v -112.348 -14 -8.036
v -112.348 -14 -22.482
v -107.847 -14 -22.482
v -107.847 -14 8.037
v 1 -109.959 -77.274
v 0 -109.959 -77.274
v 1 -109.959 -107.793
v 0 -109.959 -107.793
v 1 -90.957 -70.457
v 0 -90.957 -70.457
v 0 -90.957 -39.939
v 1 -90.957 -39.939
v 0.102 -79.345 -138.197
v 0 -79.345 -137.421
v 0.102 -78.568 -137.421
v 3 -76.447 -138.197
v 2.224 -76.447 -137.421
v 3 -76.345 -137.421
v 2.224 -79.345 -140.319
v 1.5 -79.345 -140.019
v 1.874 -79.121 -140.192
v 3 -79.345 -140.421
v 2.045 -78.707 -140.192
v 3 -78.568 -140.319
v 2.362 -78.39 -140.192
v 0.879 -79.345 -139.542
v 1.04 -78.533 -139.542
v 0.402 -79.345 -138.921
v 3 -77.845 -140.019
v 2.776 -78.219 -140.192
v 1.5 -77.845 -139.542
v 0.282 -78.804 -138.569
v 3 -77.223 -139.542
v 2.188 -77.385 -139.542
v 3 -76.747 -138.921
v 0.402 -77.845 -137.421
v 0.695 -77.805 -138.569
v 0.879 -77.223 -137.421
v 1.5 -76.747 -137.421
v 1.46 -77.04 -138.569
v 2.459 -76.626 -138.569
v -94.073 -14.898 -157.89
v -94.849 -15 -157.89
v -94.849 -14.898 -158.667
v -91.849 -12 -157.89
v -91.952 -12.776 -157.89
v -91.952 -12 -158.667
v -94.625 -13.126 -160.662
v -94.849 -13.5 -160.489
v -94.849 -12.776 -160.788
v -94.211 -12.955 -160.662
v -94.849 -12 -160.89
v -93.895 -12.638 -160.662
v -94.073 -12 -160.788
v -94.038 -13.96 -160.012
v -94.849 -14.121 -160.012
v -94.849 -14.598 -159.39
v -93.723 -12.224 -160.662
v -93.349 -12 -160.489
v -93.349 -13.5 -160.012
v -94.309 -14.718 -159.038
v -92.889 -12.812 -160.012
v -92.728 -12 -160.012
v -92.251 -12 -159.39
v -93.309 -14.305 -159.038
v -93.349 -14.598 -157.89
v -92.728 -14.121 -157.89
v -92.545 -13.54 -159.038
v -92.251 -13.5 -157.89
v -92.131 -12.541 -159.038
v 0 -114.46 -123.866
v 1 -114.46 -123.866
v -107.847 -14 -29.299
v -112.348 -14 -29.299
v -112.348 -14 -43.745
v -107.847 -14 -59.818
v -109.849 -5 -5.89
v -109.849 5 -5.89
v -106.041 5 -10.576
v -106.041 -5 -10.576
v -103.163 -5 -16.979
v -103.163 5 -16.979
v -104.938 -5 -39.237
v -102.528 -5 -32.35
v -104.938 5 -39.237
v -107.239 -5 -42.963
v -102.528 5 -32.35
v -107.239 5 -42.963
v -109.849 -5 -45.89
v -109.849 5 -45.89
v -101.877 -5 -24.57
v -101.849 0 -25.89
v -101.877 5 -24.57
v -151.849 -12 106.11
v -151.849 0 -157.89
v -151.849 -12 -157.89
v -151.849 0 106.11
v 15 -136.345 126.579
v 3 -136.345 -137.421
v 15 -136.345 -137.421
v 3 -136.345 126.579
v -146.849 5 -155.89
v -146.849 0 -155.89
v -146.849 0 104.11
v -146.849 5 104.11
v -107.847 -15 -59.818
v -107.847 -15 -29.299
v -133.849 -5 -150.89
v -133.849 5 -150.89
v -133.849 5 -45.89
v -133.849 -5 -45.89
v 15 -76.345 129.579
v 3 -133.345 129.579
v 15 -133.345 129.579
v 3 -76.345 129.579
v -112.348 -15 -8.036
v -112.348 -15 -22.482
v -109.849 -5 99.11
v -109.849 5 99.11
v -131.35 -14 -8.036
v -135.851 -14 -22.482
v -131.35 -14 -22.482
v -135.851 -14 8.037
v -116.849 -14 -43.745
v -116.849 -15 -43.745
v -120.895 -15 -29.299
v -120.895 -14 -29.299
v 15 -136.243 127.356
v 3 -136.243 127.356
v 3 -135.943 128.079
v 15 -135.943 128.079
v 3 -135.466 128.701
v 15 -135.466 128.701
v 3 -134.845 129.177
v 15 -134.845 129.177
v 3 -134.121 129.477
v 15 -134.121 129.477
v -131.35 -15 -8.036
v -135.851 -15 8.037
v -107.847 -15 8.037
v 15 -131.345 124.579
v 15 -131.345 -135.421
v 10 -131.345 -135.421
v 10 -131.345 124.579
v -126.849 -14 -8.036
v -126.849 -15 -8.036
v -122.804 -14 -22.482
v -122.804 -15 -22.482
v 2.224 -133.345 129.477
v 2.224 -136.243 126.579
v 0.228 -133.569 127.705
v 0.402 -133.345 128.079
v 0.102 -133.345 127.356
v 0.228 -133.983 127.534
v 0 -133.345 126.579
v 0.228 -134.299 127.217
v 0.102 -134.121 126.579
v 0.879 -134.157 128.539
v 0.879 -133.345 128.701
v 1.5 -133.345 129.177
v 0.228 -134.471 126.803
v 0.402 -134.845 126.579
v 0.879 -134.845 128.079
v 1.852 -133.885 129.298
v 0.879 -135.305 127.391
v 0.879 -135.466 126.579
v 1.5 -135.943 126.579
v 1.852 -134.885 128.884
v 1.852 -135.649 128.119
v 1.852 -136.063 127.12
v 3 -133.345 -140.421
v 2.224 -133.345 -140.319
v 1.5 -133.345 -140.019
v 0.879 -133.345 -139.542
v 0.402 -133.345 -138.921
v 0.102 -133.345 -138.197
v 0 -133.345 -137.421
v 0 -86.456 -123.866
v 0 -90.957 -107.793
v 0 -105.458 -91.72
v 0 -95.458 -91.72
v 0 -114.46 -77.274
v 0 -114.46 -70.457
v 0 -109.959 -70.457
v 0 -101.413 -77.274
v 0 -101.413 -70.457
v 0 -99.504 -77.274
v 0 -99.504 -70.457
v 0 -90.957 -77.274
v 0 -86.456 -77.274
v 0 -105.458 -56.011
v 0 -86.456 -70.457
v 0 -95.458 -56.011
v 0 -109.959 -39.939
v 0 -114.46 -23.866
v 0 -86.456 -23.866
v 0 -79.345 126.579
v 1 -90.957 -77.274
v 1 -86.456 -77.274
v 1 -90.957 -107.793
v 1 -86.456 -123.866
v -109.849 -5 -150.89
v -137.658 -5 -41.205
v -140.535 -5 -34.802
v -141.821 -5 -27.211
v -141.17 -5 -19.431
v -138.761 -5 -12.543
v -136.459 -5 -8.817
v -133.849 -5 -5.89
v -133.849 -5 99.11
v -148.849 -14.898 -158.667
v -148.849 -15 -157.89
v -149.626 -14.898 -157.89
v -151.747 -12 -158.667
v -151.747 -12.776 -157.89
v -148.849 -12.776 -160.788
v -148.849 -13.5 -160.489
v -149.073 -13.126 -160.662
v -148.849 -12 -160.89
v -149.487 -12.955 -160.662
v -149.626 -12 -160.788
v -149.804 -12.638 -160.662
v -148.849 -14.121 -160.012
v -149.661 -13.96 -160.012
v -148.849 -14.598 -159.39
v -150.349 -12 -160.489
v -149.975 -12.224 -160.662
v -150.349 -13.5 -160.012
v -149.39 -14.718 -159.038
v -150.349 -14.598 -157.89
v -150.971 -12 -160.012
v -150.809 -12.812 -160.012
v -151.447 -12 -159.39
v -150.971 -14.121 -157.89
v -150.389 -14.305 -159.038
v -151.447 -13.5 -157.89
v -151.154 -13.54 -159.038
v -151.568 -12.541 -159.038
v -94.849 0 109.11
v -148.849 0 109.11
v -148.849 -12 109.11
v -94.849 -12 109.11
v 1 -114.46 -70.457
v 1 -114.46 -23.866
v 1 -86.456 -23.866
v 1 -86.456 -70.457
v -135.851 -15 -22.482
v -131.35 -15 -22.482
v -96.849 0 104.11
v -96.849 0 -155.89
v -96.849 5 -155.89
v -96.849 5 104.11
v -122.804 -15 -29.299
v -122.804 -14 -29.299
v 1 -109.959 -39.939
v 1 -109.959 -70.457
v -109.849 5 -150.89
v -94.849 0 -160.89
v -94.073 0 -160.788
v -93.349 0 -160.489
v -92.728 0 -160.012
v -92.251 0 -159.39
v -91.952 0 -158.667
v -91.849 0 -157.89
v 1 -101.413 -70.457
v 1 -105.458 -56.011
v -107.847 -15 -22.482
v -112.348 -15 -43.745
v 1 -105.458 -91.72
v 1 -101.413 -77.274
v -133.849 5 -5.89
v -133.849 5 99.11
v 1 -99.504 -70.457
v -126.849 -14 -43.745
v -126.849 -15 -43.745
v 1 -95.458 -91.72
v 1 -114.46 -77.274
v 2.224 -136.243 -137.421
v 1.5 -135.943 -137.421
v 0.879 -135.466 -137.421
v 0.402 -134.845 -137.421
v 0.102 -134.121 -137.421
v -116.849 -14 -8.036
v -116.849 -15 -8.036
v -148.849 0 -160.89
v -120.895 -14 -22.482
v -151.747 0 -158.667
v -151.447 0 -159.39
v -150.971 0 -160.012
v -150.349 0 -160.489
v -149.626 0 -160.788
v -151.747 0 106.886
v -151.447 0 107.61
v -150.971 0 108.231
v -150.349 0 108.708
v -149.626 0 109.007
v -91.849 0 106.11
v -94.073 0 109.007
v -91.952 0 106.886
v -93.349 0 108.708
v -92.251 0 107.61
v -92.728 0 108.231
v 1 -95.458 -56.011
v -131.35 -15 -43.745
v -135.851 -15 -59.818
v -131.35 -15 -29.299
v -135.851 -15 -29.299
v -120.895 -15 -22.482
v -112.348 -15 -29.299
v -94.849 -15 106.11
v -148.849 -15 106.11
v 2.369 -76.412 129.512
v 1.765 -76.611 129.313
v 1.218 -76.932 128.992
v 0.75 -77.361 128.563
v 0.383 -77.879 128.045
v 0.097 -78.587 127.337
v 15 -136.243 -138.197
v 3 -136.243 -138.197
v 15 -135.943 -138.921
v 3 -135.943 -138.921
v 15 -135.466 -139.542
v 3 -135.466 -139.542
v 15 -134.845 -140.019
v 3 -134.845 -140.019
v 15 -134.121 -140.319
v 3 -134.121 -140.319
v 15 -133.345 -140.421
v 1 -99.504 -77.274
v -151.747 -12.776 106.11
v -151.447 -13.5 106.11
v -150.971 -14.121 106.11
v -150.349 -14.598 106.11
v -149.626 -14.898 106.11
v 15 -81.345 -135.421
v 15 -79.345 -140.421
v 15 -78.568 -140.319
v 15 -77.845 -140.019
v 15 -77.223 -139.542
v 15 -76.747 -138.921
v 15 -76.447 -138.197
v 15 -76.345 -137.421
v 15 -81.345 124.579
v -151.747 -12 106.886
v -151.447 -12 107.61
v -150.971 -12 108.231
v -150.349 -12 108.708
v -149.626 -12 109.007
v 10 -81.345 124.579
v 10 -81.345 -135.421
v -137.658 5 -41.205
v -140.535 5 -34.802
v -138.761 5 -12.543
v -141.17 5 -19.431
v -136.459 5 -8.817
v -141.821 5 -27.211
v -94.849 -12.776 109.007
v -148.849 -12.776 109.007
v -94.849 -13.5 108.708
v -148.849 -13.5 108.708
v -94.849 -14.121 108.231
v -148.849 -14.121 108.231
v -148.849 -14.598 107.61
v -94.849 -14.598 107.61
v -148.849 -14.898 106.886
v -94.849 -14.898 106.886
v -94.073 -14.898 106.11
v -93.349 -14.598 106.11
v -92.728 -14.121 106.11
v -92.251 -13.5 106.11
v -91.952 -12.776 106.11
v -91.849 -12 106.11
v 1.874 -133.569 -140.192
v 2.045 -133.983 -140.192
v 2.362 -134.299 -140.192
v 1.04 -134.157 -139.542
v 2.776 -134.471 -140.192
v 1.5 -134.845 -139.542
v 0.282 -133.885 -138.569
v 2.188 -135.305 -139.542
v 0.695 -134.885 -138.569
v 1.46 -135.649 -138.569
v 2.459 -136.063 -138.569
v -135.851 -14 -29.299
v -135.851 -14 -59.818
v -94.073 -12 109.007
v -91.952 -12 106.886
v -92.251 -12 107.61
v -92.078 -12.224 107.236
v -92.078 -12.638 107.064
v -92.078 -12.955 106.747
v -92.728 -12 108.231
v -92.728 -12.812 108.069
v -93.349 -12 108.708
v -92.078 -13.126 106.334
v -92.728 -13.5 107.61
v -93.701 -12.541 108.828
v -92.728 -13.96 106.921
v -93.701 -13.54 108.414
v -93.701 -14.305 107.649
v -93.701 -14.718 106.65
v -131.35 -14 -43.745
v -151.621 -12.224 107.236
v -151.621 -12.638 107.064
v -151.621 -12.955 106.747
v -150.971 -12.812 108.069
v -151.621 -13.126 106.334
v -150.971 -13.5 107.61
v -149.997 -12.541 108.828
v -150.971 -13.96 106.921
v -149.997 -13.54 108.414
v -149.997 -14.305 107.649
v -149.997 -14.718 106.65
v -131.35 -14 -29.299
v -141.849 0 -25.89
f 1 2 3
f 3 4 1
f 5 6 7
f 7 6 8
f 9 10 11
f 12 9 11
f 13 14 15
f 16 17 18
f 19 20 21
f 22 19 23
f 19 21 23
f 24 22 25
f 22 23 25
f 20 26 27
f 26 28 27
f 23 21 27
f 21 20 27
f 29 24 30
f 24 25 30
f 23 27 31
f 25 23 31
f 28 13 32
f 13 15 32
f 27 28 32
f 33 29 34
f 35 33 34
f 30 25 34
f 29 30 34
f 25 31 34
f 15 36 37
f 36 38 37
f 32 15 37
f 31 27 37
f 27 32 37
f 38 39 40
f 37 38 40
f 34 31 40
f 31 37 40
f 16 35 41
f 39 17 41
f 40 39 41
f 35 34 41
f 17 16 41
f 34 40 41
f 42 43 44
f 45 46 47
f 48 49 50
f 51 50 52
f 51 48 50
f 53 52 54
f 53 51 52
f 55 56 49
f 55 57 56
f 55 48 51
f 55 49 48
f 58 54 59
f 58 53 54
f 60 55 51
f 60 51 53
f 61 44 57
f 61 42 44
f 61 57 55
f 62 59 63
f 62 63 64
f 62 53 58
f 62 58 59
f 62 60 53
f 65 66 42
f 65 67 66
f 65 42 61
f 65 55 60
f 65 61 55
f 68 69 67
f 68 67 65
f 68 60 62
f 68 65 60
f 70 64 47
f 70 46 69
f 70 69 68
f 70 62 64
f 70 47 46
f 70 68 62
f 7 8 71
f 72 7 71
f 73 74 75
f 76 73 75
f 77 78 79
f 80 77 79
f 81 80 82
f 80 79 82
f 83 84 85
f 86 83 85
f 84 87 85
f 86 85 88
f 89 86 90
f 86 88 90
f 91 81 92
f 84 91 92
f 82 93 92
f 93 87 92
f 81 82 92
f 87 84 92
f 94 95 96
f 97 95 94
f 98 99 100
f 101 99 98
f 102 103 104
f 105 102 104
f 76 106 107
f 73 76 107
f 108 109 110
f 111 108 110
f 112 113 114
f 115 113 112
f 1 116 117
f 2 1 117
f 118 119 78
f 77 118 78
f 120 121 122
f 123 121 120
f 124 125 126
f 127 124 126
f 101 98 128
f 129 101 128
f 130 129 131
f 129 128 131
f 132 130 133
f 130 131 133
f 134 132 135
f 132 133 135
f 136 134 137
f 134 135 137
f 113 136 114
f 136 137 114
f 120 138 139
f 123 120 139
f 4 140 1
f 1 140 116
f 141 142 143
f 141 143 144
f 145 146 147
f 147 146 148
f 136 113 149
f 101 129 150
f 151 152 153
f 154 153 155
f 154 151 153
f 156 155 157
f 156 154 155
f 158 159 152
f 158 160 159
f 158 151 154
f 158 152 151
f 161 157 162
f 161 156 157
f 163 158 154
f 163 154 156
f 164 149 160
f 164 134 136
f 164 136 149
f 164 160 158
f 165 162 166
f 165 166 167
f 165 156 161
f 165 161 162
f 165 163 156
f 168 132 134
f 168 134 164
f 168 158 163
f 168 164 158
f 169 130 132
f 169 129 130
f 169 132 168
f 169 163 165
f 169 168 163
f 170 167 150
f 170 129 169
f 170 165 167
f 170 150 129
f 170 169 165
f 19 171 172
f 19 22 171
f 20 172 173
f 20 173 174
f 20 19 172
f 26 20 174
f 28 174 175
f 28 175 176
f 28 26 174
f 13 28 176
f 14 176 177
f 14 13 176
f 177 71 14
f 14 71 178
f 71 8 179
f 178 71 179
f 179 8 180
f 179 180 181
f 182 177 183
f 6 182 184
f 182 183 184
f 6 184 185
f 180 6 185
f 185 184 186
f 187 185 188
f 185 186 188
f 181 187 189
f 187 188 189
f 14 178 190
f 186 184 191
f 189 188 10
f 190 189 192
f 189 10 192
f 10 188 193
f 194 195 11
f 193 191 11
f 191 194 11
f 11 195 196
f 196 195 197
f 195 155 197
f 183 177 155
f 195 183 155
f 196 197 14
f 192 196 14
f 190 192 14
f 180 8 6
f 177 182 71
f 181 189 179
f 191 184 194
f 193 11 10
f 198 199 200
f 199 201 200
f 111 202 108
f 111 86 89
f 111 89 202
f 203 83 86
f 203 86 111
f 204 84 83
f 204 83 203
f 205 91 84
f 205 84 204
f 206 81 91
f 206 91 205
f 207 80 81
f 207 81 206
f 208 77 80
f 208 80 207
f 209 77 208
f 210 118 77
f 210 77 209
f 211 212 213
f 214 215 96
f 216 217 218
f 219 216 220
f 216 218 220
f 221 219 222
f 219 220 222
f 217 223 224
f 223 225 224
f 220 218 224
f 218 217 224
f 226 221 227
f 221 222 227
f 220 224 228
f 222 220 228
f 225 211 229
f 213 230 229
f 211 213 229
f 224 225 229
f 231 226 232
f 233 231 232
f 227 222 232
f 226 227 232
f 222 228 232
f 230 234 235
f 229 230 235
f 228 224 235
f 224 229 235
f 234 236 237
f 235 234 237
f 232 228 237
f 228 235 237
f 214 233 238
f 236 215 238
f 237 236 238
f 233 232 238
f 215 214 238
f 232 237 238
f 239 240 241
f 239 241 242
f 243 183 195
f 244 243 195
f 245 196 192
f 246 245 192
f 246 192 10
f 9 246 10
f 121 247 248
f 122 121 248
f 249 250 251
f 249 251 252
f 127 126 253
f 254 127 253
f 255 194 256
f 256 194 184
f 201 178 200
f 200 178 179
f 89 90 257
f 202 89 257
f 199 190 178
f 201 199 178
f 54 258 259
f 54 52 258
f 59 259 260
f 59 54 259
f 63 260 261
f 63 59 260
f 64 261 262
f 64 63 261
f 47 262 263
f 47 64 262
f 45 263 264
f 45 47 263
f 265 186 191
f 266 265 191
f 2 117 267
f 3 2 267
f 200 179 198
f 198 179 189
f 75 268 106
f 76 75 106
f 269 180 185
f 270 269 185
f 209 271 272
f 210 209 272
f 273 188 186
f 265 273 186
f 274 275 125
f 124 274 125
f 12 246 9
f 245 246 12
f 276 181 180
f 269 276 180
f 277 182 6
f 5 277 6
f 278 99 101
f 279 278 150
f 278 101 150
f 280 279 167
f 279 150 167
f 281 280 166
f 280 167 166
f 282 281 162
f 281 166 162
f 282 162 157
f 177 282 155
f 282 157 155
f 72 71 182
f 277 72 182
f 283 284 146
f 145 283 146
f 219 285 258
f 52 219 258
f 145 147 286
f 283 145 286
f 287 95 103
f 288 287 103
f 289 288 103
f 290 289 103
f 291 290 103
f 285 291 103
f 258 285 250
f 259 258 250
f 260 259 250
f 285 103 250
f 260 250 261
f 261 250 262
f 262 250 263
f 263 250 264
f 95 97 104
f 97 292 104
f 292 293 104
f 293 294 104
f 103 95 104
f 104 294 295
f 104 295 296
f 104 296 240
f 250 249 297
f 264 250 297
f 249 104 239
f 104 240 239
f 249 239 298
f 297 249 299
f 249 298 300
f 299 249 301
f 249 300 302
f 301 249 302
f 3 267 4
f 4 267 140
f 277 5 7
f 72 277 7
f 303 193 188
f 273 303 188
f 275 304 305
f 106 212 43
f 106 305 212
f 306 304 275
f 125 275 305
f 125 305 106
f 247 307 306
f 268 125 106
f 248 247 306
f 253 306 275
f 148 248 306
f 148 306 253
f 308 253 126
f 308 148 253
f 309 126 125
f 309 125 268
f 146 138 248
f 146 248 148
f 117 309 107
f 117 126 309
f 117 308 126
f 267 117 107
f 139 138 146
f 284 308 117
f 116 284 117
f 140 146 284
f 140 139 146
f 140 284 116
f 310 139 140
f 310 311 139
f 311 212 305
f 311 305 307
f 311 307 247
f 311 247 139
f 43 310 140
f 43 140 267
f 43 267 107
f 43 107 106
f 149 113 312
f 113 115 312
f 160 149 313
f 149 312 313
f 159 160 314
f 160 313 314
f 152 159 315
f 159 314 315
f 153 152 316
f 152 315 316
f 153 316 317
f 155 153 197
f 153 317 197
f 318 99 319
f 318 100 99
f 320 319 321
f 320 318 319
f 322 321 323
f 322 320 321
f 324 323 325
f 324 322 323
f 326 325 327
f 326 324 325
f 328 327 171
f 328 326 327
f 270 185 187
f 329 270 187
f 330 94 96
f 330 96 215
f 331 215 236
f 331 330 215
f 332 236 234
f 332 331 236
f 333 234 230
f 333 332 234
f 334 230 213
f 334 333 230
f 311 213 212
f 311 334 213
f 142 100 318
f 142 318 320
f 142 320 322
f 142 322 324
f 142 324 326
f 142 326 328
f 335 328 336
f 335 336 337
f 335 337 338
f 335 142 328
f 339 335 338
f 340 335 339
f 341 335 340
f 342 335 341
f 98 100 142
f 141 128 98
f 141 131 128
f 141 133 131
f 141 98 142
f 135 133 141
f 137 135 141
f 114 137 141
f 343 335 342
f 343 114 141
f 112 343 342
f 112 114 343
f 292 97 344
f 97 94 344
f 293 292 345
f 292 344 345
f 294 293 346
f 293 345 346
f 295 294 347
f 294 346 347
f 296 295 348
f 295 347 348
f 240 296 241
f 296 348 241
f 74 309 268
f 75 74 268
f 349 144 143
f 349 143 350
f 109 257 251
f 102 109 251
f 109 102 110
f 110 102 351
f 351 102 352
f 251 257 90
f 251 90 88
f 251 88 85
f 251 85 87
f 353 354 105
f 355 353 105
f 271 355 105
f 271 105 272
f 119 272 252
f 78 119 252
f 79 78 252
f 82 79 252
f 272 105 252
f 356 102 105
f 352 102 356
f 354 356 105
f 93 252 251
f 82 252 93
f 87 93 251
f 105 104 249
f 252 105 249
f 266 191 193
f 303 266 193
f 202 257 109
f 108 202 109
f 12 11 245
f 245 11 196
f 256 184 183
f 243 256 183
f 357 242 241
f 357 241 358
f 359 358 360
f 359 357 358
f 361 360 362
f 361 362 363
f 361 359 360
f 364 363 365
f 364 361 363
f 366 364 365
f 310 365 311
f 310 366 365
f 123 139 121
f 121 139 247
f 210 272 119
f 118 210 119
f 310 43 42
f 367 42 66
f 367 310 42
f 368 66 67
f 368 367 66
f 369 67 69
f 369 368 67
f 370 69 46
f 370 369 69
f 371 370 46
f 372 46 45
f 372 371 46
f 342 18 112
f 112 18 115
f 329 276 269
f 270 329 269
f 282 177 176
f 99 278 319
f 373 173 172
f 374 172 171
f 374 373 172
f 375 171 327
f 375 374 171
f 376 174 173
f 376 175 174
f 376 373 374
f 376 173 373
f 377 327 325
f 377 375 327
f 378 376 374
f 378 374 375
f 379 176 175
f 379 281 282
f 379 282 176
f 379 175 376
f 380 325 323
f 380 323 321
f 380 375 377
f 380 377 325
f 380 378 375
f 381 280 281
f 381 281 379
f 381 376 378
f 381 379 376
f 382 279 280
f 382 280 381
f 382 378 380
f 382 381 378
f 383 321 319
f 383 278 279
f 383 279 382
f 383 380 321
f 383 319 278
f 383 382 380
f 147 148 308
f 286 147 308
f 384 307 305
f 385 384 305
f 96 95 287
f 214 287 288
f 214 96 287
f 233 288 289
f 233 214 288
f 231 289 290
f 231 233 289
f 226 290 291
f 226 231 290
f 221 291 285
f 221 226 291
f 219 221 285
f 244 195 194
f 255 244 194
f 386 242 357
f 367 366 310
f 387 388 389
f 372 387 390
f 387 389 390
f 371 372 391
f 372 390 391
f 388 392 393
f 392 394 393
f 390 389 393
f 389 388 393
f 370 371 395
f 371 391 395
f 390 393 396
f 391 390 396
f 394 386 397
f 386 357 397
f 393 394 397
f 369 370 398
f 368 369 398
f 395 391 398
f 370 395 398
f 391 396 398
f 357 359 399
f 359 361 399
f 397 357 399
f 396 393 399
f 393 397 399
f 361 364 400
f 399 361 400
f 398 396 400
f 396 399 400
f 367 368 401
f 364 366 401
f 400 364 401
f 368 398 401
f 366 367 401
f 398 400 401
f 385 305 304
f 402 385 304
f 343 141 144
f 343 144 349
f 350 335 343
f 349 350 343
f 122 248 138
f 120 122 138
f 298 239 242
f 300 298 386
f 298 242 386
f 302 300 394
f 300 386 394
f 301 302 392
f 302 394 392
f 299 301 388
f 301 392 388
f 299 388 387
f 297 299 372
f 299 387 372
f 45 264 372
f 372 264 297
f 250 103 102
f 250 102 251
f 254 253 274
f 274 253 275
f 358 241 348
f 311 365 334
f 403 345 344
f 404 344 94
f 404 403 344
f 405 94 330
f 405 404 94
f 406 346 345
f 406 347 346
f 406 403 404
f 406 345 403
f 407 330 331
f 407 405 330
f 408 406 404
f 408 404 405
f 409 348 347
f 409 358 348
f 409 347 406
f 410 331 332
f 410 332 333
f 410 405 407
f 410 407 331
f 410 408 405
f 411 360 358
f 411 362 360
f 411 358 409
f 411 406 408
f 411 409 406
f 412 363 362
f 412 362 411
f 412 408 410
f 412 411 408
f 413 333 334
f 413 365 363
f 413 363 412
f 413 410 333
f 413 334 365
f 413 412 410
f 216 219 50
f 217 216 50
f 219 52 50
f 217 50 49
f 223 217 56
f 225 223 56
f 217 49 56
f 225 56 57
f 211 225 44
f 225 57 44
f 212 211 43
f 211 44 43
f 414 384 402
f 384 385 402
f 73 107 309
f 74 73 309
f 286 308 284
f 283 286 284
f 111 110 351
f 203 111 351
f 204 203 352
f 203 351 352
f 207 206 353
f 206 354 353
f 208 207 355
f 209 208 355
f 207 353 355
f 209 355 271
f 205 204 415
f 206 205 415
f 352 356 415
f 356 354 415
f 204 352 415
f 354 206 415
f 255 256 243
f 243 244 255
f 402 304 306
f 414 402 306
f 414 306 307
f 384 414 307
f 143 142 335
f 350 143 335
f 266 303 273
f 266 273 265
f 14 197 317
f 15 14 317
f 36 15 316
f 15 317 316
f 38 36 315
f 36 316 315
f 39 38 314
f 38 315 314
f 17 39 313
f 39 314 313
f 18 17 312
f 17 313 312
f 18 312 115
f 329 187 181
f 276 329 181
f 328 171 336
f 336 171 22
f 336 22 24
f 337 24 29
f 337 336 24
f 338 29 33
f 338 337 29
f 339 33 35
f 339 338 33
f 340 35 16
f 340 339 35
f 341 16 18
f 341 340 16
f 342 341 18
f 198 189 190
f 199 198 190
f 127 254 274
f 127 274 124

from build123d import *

# Parameters (mm, degrees)
F0_W      = 60
F0_H      = 270
F2_DEPTH  = 15
F3_W      = 50
F3_H      = 260
F4_DEPTH  = 5
F1_W      = 60
F1_H      = 270
F5_DEPTH  = 15
F6_W      = 50
F6_H      = 260
F7_DEPTH  = 5
F9_DEPTH  = 10
F10_R     = 3
F11_R     = 3
F13_DEPTH = 1
F15_DEPTH = 1


# Not quite as in the source:
# - a feature names something its author has since deleted; it is built from what else it names


with BuildPart() as f2:
    # F0 (on Front) → F2 (new body)
    with BuildSketch(Plane.XZ):
        with Locations((-121.8493213905, -25.8904273567)):
            Rectangle(F0_W, F0_H)
    extrude(amount=F2_DEPTH)

    # F3 (on face) → F4 (join)
    with BuildSketch(Plane.XZ):
        with Locations((-121.8493213905, -25.8904273567)):
            Rectangle(F3_W, F3_H)
    extrude(amount=-F4_DEPTH)

    # F8 (on face) → F9 (cut)
    with BuildSketch(Plane(origin=(0, 5, 0), x_dir=(-1, 0, 0), z_dir=(0, 1, 0))):
        with BuildLine():
            Line((109.8493213905, -150.8904273567), (133.8493213905, -150.8904273567))
            Line((133.8493213905, -150.8904273567), (133.8493213905, -45.8904273567))
            add(Edge.make_bspline(
                [(109.8493213905, -45.8904273567), (121.8493213905, -57.1404273567), (133.8493213905, -45.8904273567)],
                knots=[2.4980915448, 2.4980915448, 2.4980915448, 3.7850937624, 3.7850937624, 3.7850937624], degree=2, weights=[1, 0.8, 1]))
            Line((109.8493213905, -45.8904273567), (109.8493213905, -150.8904273567))
        make_face()
        with BuildLine():
            add(Edge.make_bspline(
                [(133.8493213905, -5.8904273567), (128.5159880572, -0.8904273567), (121.8493213905, -0.8904273567)],
                knots=[5.6396841984, 5.6396841984, 5.6396841984, 6.2831853072, 6.2831853072, 6.2831853072], degree=2, weights=[1, 0.9486832981, 1]))
            Line((133.8493213905, -5.8904273567), (133.8493213905, 99.1095726433))
            Line((133.8493213905, 99.1095726433), (109.8493213905, 99.1095726433))
            Line((109.8493213905, 99.1095726433), (109.8493213905, -5.8904273567))
            add(Edge.make_bspline(
                [(121.8493213905, -0.8904273567), (115.1826547239, -0.8904273567), (109.8493213905, -5.8904273567)],
                knots=[0, 0, 0, 0.6435011088, 0.6435011088, 0.6435011088], degree=2, weights=[1, 0.9486832981, 1]))
        make_face()
        with BuildLine():
            Line((133.8493213905, -5.8904273567), (133.8493213905, -45.8904273567))
            add(Edge.make_bspline(
                [(133.8493213905, -45.8904273567), (155.1826547239, -25.8904273567), (133.8493213905, -5.8904273567)],
                knots=[3.7850937624, 3.7850937624, 3.7850937624, 5.6396841984, 5.6396841984, 5.6396841984], degree=2, weights=[1, 0.6, 1]))
        make_face()
        with BuildLine():
            add(Edge.make_bspline(
                [(109.8493213905, -45.8904273567), (121.8493213905, -57.1404273567), (133.8493213905, -45.8904273567)],
                knots=[2.4980915448, 2.4980915448, 2.4980915448, 3.7850937624, 3.7850937624, 3.7850937624], degree=2, weights=[1, 0.8, 1]))
            Line((133.8493213905, -45.8904273567), (133.8493213905, -5.8904273567))
            add(Edge.make_bspline(
                [(133.8493213905, -5.8904273567), (128.5159880572, -0.8904273567), (121.8493213905, -0.8904273567)],
                knots=[5.6396841984, 5.6396841984, 5.6396841984, 6.2831853072, 6.2831853072, 6.2831853072], degree=2, weights=[1, 0.9486832981, 1]))
            add(Edge.make_bspline(
                [(121.8493213905, -0.8904273567), (115.1826547239, -0.8904273567), (109.8493213905, -5.8904273567)],
                knots=[0, 0, 0, 0.6435011088, 0.6435011088, 0.6435011088], degree=2, weights=[1, 0.9486832981, 1]))
            Line((109.8493213905, -5.8904273567), (109.8493213905, -45.8904273567))
        make_face()
        with BuildLine():
            add(Edge.make_bspline(
                [(109.8493213905, -5.8904273567), (88.5159880572, -25.8904273567), (109.8493213905, -45.8904273567)],
                knots=[0.6435011088, 0.6435011088, 0.6435011088, 2.4980915448, 2.4980915448, 2.4980915448], degree=2, weights=[1, 0.6, 1]))
            Line((109.8493213905, -45.8904273567), (109.8493213905, -5.8904273567))
        make_face()
    extrude(amount=-F9_DEPTH, mode=Mode.SUBTRACT)

    # F10
    f10_edges = [f2.edges().sort_by_distance(p)[0] for p in [
        (-121.849321, -15, 109.109573),
        (-151.849321, -7.5, 109.109573),
        (-91.849321, -7.5, 109.109573),
        (-91.849321, -15, -25.890427),
        (-151.849321, -15, -25.890427),
        (-121.849321, -15, -160.890427),
        (-151.849321, -7.5, -160.890427),
        (-91.849321, -7.5, -160.890427),
    ]]
    fillet(f10_edges, radius=F10_R)

    # F14 (on face) → F15 (cut)
    with BuildSketch(Plane.XZ.offset(15)):
        Polygon((-135.8514606564, -59.817634666), (-131.3503910235, -43.7448419752), (-131.3503910235, -29.2987280125), (-135.8514606564, -29.2987280125), align=None)
        Polygon((-122.8037913994, -29.2987280125), (-126.8493213905, -43.7448419752), (-116.8493213905, -43.7448419752), (-120.8948513817, -29.2987280125), align=None)
        Polygon((-112.3482517576, -29.2987280125), (-112.3482517576, -43.7448419752), (-107.8471821246, -59.817634666), (-107.8471821246, -29.2987280125), align=None)
        Polygon((-107.8471821246, 8.0367799526), (-112.3482517576, -8.0360127381), (-112.3482517576, -22.4821267008), (-107.8471821246, -22.4821267008), align=None)
        Polygon((-116.8493213905, -8.0360127381), (-126.8493213905, -8.0360127381), (-122.8037913994, -22.4821267008), (-120.8948513817, -22.4821267008), align=None)
        Polygon((-131.3503910235, -22.4821267008), (-131.3503910235, -8.0360127381), (-135.8514606564, 8.0367799526), (-135.8514606564, -22.4821267008), align=None)
    extrude(amount=-F15_DEPTH, mode=Mode.SUBTRACT)


with BuildPart() as f5:
    # F1 (on Right) → F5 (new body)
    with BuildSketch(Plane.YZ):
        with Locations((-106.3447256267, -5.4207965732)):
            Rectangle(F1_W, F1_H)
    extrude(amount=F5_DEPTH)

    # F6 (on face) → F7 (cut)
    with BuildSketch(Plane.YZ.offset(15)):
        with Locations((-106.3447256267, -5.4207965732)):
            Rectangle(F6_W, F6_H)
    extrude(amount=-F7_DEPTH, mode=Mode.SUBTRACT)

    # F11
    f11_edges = [f5.edges().sort_by_distance(p)[0] for p in [
        (7.5, -136.344726, 129.579203),
        (0, -106.344726, 129.579203),
        (0, -136.344726, -5.420797),
        (0, -76.344726, -5.420797),
        (0, -106.344726, -140.420797),
        (7.5, -76.344726, -140.420797),
        (7.5, -136.344726, -140.420797),
    ]]
    fillet(f11_edges, radius=F11_R)

    # F12 (on face) → F13 (cut)
    with BuildSketch(Plane(origin=(0, 0, 0), x_dir=(0, -1, 0), z_dir=(-1, 0, 0))):
        Polygon((105.4581373974, -56.0113014256), (95.4581373974, -56.0113014256), (99.5036673885, -70.4574153882), (101.4126074063, -70.4574153882), align=None)
        Polygon((90.9570677645, -70.4574153882), (90.9570677645, -39.9385087348), (86.4559981315, -23.8657160441), (86.4559981315, -70.4574153882), align=None)
        Polygon((114.4602766633, -23.8657160441), (109.9592070304, -39.9385087348), (109.9592070304, -70.4574153882), (114.4602766633, -70.4574153882), align=None)
        Polygon((109.9592070304, -77.2740167), (109.9592070304, -107.7929233534), (114.4602766633, -123.8657160441), (114.4602766633, -77.2740167), align=None)
        Polygon((99.5036673885, -77.2740167), (95.4581373974, -91.7201306627), (105.4581373974, -91.7201306627), (101.4126074063, -77.2740167), align=None)
        Polygon((86.4559981315, -123.8657160441), (90.9570677645, -107.7929233534), (90.9570677645, -77.2740167), (86.4559981315, -77.2740167), align=None)
    extrude(amount=-F13_DEPTH, mode=Mode.SUBTRACT)


solid = Compound([f2.part, f5.part])
